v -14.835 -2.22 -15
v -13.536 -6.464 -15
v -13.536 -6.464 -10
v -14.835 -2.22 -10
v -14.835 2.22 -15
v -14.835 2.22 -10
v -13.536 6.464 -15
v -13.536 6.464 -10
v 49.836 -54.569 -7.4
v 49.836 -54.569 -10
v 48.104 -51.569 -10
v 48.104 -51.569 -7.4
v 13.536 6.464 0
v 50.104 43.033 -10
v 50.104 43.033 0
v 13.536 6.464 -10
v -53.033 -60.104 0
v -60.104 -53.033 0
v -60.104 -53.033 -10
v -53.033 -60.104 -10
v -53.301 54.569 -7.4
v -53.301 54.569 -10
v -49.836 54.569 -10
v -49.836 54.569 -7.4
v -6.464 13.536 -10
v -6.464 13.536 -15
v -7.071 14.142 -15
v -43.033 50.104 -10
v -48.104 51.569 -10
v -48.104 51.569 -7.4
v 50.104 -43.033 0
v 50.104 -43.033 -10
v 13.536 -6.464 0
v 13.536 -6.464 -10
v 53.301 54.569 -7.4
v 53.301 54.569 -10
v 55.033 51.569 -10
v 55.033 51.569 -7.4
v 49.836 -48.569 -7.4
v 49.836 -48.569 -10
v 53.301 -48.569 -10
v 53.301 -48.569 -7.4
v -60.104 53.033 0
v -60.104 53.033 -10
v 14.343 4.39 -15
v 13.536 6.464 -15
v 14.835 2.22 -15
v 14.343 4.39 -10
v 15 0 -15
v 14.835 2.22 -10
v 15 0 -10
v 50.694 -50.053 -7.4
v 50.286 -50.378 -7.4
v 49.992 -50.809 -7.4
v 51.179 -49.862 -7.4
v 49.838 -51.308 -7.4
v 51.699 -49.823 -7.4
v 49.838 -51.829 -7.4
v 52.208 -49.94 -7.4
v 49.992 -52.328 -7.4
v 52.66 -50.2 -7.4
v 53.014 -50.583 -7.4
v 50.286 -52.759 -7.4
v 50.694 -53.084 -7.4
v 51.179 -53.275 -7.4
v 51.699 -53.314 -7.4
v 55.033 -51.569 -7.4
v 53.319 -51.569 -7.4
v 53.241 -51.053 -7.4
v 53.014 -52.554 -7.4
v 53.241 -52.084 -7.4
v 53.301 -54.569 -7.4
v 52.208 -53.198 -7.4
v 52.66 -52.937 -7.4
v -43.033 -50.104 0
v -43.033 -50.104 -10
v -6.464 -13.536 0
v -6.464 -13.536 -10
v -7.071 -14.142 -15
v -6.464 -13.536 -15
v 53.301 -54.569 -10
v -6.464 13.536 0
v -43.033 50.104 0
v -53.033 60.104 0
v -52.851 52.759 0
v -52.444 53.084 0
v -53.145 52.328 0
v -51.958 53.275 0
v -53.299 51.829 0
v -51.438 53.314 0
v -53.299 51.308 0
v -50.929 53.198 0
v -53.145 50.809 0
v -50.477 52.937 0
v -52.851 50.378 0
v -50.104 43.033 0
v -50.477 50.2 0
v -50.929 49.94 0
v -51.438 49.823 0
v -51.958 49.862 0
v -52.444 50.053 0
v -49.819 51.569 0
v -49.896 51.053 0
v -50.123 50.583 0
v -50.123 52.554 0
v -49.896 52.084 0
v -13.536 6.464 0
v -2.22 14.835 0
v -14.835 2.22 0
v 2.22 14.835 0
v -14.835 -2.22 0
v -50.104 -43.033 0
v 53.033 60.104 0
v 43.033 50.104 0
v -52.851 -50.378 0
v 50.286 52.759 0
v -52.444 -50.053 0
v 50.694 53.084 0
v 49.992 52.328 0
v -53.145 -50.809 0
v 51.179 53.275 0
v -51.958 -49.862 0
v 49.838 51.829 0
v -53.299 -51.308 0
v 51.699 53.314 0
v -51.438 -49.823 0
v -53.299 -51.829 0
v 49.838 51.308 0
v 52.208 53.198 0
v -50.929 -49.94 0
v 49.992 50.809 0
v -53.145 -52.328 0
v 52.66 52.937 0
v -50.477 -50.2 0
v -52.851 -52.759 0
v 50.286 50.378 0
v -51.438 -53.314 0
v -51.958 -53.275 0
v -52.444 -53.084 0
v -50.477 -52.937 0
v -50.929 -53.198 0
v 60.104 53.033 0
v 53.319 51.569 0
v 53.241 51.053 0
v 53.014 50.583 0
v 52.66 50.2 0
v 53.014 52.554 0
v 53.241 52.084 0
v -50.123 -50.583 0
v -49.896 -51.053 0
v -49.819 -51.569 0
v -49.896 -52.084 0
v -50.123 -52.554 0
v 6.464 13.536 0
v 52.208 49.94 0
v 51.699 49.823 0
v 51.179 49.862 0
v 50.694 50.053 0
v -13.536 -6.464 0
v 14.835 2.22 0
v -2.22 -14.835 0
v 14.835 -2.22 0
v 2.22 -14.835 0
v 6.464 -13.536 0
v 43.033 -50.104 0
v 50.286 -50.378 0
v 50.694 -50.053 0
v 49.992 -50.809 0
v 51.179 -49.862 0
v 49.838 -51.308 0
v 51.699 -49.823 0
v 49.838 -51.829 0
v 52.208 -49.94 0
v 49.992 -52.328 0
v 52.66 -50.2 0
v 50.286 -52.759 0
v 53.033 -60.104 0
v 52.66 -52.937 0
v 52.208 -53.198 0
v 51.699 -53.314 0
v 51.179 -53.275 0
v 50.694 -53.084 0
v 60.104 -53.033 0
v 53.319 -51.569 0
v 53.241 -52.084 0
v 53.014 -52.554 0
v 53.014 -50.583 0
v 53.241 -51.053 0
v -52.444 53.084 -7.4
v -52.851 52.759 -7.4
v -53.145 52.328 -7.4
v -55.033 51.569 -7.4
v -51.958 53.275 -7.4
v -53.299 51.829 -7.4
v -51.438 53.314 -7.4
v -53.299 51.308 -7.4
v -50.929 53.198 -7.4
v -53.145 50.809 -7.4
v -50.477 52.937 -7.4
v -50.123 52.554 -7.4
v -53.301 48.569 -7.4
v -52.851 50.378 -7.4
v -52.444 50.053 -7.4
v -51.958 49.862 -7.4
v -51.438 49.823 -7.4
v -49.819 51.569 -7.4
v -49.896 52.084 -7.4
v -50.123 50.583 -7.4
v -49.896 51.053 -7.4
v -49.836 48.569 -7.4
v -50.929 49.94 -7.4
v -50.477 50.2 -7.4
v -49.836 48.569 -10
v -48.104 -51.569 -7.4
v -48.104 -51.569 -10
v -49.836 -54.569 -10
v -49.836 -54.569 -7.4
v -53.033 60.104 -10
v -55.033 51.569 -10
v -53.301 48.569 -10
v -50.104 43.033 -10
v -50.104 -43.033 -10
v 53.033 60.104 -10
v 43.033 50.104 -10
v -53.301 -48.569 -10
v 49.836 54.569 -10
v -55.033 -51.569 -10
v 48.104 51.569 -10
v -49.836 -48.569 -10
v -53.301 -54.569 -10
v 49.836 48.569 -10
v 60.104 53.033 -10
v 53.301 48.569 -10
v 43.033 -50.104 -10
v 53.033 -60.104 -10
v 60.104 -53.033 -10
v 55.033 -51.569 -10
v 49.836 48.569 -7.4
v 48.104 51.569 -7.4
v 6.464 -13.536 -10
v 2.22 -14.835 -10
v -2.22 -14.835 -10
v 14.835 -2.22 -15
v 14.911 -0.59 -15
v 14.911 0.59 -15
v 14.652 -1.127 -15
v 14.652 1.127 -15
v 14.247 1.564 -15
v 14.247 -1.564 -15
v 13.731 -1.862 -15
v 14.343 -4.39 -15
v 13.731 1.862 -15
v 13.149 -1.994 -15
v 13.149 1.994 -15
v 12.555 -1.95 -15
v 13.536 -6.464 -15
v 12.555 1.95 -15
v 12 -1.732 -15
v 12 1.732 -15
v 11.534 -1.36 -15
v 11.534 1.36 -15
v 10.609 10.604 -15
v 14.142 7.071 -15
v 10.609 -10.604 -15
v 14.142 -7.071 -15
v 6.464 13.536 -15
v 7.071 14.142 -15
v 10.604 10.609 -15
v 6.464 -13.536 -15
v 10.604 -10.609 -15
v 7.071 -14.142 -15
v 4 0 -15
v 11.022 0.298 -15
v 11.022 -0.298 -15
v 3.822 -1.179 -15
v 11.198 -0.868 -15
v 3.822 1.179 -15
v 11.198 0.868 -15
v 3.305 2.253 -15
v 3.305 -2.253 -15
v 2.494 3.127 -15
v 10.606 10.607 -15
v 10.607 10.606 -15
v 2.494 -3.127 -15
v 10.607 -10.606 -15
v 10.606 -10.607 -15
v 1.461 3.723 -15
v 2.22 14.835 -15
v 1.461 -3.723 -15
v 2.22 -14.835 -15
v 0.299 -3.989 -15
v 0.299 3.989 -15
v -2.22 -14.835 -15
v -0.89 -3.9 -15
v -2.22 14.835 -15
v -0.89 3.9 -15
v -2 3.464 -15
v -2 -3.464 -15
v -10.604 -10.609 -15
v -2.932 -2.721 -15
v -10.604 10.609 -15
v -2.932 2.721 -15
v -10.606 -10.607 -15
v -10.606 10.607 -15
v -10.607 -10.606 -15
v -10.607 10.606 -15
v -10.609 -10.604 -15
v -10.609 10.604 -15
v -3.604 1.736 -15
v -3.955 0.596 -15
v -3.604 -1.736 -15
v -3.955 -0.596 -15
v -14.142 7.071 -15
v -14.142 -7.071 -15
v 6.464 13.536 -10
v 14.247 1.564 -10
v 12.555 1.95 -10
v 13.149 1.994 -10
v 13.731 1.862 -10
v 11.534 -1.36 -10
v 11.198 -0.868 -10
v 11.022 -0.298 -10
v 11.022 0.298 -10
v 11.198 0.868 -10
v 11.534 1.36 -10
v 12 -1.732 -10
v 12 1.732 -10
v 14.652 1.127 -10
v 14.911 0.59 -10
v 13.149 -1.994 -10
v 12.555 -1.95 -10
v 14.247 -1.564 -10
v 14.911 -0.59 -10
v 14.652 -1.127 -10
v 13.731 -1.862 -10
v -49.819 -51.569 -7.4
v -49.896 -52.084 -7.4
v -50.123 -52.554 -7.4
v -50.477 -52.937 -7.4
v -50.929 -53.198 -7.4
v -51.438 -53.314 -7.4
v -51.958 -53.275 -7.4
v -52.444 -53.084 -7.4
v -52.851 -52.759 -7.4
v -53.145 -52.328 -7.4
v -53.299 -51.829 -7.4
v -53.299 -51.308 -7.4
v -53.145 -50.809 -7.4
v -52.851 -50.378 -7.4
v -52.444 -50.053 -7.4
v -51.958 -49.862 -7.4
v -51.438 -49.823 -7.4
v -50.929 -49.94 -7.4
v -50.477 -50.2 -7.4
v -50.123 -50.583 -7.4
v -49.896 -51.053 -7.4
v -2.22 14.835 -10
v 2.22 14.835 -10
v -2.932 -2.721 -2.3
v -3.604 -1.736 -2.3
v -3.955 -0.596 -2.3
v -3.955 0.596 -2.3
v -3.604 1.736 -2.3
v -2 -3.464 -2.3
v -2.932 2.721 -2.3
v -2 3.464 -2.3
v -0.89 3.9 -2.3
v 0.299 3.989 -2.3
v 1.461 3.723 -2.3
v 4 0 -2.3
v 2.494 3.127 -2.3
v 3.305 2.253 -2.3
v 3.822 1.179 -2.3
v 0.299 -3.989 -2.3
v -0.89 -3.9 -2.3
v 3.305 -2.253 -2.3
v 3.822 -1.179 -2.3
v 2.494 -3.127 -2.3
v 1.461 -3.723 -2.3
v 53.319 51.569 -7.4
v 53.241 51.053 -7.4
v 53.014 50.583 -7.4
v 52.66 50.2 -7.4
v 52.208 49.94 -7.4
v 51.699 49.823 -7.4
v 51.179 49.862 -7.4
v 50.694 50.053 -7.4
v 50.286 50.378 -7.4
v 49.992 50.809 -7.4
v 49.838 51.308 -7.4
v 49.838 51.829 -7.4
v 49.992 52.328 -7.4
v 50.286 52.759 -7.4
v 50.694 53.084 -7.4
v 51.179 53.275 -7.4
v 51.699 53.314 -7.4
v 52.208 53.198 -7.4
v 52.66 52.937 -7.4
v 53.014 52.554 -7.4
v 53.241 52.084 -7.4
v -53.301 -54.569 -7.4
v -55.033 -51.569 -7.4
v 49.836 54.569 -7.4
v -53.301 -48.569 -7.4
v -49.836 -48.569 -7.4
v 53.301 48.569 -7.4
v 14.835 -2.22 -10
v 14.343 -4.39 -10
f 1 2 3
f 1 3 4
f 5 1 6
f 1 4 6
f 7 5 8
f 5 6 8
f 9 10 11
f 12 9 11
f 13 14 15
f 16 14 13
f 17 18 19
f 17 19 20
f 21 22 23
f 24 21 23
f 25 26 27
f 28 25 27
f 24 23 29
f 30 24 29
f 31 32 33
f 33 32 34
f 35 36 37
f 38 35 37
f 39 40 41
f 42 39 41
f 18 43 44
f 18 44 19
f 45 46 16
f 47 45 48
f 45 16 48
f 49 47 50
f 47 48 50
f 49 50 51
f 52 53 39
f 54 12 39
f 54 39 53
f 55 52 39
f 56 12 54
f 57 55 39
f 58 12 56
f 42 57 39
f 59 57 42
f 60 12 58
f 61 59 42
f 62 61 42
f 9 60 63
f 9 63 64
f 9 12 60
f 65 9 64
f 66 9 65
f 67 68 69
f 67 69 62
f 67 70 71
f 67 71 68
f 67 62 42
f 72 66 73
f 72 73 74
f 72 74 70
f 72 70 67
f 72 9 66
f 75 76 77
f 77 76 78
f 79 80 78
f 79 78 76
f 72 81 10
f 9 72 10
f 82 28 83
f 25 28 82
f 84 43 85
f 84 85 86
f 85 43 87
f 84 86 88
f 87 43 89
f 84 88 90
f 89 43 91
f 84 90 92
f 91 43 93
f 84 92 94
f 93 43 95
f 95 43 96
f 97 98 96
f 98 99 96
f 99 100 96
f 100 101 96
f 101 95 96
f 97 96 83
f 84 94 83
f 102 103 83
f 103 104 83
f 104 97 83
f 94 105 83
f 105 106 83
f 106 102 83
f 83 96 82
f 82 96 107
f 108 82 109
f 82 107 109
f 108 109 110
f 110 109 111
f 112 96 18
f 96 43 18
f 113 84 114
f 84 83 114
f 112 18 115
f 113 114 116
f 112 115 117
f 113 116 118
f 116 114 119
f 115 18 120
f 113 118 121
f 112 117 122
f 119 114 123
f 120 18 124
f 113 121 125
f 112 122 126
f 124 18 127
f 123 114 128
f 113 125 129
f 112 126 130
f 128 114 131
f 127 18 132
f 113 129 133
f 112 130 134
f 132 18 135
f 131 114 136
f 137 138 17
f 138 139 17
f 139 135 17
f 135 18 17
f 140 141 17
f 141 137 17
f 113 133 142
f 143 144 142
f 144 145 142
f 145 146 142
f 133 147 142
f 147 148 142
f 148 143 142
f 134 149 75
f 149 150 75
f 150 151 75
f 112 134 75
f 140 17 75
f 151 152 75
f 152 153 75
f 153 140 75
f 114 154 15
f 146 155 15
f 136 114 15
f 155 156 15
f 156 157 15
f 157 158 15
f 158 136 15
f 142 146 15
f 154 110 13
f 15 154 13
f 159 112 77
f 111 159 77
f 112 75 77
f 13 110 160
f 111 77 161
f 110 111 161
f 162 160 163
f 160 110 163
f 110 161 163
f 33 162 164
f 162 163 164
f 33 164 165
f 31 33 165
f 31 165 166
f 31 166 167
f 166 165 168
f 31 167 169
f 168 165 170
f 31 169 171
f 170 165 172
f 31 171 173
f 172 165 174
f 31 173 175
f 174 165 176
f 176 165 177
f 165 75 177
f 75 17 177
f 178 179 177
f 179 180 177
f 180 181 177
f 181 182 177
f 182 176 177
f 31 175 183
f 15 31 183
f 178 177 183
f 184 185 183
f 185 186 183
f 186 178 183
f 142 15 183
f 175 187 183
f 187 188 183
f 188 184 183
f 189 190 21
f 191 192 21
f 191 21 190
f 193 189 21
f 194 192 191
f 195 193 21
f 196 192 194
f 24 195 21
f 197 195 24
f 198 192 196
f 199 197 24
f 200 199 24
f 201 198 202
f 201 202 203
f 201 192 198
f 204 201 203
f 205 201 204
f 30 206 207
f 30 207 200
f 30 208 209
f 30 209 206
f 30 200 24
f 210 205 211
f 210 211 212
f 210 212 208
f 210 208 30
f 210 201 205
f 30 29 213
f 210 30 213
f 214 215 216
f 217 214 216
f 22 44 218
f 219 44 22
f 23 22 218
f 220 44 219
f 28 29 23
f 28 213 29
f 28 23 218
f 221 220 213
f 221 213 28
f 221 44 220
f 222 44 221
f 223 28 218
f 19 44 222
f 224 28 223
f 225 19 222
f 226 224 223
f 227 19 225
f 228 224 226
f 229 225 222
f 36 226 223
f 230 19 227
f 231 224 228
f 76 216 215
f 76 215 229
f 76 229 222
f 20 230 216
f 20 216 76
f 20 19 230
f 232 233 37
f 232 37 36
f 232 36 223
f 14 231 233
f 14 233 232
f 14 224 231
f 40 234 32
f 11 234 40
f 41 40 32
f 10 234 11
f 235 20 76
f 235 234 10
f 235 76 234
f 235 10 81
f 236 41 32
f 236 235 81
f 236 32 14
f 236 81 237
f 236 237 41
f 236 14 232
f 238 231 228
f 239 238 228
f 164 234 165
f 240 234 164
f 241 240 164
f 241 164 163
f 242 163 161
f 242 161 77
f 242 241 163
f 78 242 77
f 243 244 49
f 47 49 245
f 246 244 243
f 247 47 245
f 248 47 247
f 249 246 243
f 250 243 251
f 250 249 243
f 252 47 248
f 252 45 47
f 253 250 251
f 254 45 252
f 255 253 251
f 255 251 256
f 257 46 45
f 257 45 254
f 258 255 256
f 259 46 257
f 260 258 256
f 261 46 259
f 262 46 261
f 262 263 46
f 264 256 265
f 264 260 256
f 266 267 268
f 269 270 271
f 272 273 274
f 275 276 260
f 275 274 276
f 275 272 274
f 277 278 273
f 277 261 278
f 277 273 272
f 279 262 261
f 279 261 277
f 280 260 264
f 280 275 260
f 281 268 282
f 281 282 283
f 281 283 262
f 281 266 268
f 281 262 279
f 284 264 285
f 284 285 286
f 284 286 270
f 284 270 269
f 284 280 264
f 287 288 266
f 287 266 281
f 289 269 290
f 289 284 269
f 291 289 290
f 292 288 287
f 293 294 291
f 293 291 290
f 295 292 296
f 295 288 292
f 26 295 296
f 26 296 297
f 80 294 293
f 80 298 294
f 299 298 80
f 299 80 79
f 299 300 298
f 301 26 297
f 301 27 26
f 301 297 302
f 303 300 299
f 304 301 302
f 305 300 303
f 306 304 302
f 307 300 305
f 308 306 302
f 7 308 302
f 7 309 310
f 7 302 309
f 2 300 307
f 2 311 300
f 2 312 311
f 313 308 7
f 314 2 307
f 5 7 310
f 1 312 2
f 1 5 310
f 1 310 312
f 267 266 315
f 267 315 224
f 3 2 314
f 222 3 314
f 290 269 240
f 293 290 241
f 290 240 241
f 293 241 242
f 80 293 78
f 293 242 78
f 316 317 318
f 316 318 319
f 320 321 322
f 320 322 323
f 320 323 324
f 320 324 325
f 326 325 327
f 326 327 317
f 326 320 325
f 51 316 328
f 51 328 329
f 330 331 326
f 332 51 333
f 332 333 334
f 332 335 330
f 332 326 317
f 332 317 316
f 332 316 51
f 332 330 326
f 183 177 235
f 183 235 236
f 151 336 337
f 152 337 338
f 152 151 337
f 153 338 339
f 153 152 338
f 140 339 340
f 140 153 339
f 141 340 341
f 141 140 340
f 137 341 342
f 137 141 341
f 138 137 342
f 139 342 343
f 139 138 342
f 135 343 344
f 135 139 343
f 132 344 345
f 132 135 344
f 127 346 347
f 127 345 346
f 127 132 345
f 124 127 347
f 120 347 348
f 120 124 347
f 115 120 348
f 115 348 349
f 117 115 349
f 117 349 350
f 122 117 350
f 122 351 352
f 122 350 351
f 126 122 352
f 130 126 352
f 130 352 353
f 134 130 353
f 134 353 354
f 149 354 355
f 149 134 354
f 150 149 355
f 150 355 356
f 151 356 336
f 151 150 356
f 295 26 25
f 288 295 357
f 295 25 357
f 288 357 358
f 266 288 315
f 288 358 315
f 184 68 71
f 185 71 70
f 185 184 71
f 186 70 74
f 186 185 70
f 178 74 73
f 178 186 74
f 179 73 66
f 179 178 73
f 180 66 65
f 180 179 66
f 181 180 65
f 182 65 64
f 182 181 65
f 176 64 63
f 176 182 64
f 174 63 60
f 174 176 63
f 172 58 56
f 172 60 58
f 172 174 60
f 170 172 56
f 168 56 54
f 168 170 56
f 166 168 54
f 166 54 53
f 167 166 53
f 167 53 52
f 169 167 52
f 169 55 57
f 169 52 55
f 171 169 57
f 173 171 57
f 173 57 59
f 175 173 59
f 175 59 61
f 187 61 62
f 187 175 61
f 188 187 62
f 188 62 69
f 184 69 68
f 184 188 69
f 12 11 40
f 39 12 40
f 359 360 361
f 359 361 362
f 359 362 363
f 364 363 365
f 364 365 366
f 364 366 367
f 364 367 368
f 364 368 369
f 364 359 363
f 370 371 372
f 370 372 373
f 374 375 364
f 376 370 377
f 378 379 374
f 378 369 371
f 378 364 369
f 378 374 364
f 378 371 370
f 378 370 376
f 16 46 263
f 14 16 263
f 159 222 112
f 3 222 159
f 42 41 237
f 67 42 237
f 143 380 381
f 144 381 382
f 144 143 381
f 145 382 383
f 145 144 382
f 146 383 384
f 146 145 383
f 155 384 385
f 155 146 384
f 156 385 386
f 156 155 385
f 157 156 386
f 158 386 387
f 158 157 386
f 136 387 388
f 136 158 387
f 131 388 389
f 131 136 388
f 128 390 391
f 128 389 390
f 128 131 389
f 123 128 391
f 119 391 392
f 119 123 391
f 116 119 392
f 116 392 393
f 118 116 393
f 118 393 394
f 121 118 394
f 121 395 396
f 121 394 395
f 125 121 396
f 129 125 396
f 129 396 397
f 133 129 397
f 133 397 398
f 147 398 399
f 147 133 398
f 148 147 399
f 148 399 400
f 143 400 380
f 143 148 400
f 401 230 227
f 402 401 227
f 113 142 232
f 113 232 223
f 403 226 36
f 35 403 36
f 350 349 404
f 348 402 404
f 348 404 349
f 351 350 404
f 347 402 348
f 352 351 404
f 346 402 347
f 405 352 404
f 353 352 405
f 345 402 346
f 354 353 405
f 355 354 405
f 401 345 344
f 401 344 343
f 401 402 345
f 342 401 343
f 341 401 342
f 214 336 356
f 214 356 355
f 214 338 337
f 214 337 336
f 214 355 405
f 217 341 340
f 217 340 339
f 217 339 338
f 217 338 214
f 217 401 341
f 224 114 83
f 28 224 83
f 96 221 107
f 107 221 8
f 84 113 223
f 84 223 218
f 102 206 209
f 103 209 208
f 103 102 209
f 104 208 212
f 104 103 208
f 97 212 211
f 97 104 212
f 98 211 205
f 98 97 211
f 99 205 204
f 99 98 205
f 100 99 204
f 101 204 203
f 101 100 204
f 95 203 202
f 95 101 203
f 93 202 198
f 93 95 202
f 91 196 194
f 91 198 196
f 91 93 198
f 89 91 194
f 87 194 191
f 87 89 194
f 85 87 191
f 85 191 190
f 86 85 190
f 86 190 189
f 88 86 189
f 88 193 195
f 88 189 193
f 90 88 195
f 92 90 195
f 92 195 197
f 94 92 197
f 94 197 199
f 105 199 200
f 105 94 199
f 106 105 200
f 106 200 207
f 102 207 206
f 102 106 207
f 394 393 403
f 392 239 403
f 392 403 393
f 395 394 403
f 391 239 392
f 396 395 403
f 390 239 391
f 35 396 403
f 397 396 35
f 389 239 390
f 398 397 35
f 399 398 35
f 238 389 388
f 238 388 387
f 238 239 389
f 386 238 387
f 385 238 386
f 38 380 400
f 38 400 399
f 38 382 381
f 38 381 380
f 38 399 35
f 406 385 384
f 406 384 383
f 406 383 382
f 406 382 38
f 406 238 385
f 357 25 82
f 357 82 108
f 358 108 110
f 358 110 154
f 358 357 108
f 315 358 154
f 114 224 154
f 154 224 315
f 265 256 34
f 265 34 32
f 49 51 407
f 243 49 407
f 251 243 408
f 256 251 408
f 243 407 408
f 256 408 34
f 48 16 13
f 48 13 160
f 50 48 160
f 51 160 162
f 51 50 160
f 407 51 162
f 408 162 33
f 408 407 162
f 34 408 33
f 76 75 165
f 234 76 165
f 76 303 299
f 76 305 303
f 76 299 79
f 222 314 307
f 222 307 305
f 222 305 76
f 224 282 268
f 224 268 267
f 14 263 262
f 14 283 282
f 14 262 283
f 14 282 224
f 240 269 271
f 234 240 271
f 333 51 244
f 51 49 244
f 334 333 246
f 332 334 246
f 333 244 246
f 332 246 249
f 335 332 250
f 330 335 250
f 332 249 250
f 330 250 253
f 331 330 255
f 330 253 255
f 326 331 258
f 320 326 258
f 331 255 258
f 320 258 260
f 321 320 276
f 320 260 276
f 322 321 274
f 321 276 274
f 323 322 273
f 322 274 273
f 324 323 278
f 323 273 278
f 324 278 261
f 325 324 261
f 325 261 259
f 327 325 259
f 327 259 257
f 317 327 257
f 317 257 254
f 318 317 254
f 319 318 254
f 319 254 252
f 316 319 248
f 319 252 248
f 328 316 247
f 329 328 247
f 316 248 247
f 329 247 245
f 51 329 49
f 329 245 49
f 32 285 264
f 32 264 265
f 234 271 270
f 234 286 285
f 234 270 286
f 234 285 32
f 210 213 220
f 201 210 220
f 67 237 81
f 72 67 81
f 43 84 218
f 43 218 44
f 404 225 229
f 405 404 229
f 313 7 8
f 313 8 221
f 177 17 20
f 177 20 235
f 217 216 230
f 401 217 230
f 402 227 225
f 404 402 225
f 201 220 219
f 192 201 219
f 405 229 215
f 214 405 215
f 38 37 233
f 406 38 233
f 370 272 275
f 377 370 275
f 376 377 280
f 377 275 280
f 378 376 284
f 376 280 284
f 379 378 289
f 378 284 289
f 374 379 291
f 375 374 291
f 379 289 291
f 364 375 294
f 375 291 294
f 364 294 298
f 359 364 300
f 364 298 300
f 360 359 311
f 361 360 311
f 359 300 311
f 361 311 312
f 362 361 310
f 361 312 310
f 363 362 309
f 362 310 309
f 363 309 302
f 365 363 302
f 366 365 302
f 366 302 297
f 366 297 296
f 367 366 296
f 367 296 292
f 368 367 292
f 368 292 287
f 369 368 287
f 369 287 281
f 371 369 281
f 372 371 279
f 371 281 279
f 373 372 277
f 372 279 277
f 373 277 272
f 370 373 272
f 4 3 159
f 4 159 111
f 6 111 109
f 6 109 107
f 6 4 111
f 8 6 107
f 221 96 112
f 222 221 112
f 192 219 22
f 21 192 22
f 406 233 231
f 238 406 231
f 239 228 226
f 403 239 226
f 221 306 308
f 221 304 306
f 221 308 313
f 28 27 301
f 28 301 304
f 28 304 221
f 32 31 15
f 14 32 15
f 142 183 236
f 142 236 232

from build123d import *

# Parameters (mm, degrees)
SKETCH031_R        = 1.75
PAD018_DEPTH       = 10
POCKET003_DEPTH    = 2.6
PAD019_DEPTH       = 10
SKETCH034_R        = 15
PAD020_DEPTH       = 5
SKETCH035_R        = 4
POCKET004_DEPTH    = 12.7
SKETCH036_R        = 2
POCKET005_DEPTH    = 5
PAD021_DEPTH       = 5
POLARPATTERN_COUNT = 4


with BuildPart() as part:
    # Sketch031 (on Face1 of Binder005) → Pad018 (new body)
    with BuildSketch(Plane(origin=(0, 0, 0), x_dir=(1, 0, 0), z_dir=(0, 0, -1))):
        Polygon((-60.104076, 53.033009), (-53.033009, 60.104076), (53.033009, 60.104076), (60.104076, 53.033009), (60.104076, -53.033009), (53.033009, -60.104076), (-53.033009, -60.104076), (-60.104076, -53.033009), align=None)
        with Locations((-51.568542, -51.568542)):
            Circle(SKETCH031_R, mode=Mode.SUBTRACT)
        with Locations((51.568542, -51.568542)):
            Circle(SKETCH031_R, mode=Mode.SUBTRACT)
        with Locations((51.568542, 51.568542)):
            Circle(SKETCH031_R, mode=Mode.SUBTRACT)
        with Locations((-51.568542, 51.568542)):
            Circle(SKETCH031_R, mode=Mode.SUBTRACT)
        Polygon((-43.033009, 50.104076), (43.033009, 50.104076), (50.104076, 43.033009), (50.104076, -43.033009), (43.033009, -50.104076), (-43.033009, -50.104076), (-50.104076, -43.033009), (-50.104076, 43.033009), align=None, mode=Mode.SUBTRACT)
    extrude(amount=PAD018_DEPTH)

    # Sketch032 (on Face22 of Pad018) → Pocket003 (cut)
    with BuildSketch(Plane(origin=(0, 0, -10), x_dir=(1, 0, 0), z_dir=(0, 0, -1))):
        Polygon((-48.104441, -51.568542), (-49.836492, -48.568542), (-53.300593, -48.568542), (-55.032644, -51.568542), (-53.300593, -54.568542), (-49.836492, -54.568542), align=None)
        Polygon((53.300593, -48.568542), (49.836492, -48.568542), (48.104441, -51.568542), (49.836492, -54.568542), (53.300593, -54.568542), (55.032644, -51.568542), align=None)
        Polygon((53.300593, 54.568542), (49.836492, 54.568542), (48.104441, 51.568542), (49.836492, 48.568542), (53.300593, 48.568542), (55.032644, 51.568542), align=None)
        Polygon((-49.836492, 54.568542), (-53.300593, 54.568542), (-55.032644, 51.568542), (-53.300593, 48.568542), (-49.836492, 48.568542), (-48.104441, 51.568542), align=None)
    extrude(amount=-POCKET003_DEPTH, mode=Mode.SUBTRACT)

    # Sketch033 (on Face5 of Pocket003) → Pad019 (join)
    with BuildSketch(Plane(origin=(0, 0, -10), x_dir=(1, 0, 0), z_dir=(0, 0, -1))):
        with BuildLine():
            Line((-43.033009, -50.104076), (-6.464466, -13.535534))
            ThreePointArc((-6.464466, -13.535534), (0, -15), (6.464466, -13.535534))
            Line((43.033009, -50.104076), (6.464466, -13.535534))
            Line((50.104076, -43.033009), (43.033009, -50.104076))
            Line((50.104076, -43.033009), (13.535534, -6.464466))
            ThreePointArc((13.535534, -6.464466), (15, 0), (13.535534, 6.464466))
            Line((50.104076, 43.033009), (13.535534, 6.464466))
            Line((43.033009, 50.104076), (50.104076, 43.033009))
            Line((43.033009, 50.104076), (6.464466, 13.535534))
            ThreePointArc((6.464466, 13.535534), (0, 15), (-6.464466, 13.535534))
            Line((-43.033009, 50.104076), (-6.464466, 13.535534))
            Line((-50.104076, 43.033009), (-43.033009, 50.104076))
            Line((-50.104076, 43.033009), (-13.535534, 6.464466))
            ThreePointArc((-13.535534, 6.464466), (-15, 0), (-13.535534, -6.464466))
            Line((-50.104076, -43.033009), (-13.535534, -6.464466))
            Line((-43.033009, -50.104076), (-50.104076, -43.033009))
        make_face()
    extrude(amount=-PAD019_DEPTH)

    # Sketch034 (on Face32 of Pad019) → Pad020 (join)
    with BuildSketch(Plane(origin=(0, 0, -10), x_dir=(1, 0, 0), z_dir=(0, 0, -1))):
        Circle(SKETCH034_R)
    extrude(amount=PAD020_DEPTH)

    # Sketch035 (on Face65 of Pad020) → Pocket004 (cut)
    with BuildSketch(Plane(origin=(0, 0, -15), x_dir=(1, 0, 0), z_dir=(0, 0, -1))):
        Circle(SKETCH035_R)
    extrude(amount=-POCKET004_DEPTH, mode=Mode.SUBTRACT)

    # Sketch036 (on Face65 of Pocket004) → Pocket005 (cut)
    with BuildSketch(Plane(origin=(0, 0, -15), x_dir=(1, 0, 0), z_dir=(0, 0, -1))):
        with Locations((13, 0)):
            Circle(SKETCH036_R)
    extrude(amount=-POCKET005_DEPTH, mode=Mode.SUBTRACT)

    # Sketch039 (on DatumPlane) → Pad021 (join, symmetric)
    with BuildSketch(Plane(origin=(53.235209, -53.235209, -8.333333), x_dir=(0.707107, -0.707107, 0), z_dir=(-0.707107, -0.707107, 0))):
        Polygon((-9.42809, -1.666667), (-63.285955, -1.666667), (-63.285955, -6.666667), (-60.285955, -6.666667), align=None)
    pad021 = extrude(amount=PAD021_DEPTH, both=True)

    # PolarPattern: Pad021 ×4 about axis
    polarpattern_axis = Axis((0, 0, 0), (0, 0, 1))
    for i in range(1, POLARPATTERN_COUNT):
        add(pad021.rotate(polarpattern_axis, i * 360 / POLARPATTERN_COUNT))


solid = part.part
